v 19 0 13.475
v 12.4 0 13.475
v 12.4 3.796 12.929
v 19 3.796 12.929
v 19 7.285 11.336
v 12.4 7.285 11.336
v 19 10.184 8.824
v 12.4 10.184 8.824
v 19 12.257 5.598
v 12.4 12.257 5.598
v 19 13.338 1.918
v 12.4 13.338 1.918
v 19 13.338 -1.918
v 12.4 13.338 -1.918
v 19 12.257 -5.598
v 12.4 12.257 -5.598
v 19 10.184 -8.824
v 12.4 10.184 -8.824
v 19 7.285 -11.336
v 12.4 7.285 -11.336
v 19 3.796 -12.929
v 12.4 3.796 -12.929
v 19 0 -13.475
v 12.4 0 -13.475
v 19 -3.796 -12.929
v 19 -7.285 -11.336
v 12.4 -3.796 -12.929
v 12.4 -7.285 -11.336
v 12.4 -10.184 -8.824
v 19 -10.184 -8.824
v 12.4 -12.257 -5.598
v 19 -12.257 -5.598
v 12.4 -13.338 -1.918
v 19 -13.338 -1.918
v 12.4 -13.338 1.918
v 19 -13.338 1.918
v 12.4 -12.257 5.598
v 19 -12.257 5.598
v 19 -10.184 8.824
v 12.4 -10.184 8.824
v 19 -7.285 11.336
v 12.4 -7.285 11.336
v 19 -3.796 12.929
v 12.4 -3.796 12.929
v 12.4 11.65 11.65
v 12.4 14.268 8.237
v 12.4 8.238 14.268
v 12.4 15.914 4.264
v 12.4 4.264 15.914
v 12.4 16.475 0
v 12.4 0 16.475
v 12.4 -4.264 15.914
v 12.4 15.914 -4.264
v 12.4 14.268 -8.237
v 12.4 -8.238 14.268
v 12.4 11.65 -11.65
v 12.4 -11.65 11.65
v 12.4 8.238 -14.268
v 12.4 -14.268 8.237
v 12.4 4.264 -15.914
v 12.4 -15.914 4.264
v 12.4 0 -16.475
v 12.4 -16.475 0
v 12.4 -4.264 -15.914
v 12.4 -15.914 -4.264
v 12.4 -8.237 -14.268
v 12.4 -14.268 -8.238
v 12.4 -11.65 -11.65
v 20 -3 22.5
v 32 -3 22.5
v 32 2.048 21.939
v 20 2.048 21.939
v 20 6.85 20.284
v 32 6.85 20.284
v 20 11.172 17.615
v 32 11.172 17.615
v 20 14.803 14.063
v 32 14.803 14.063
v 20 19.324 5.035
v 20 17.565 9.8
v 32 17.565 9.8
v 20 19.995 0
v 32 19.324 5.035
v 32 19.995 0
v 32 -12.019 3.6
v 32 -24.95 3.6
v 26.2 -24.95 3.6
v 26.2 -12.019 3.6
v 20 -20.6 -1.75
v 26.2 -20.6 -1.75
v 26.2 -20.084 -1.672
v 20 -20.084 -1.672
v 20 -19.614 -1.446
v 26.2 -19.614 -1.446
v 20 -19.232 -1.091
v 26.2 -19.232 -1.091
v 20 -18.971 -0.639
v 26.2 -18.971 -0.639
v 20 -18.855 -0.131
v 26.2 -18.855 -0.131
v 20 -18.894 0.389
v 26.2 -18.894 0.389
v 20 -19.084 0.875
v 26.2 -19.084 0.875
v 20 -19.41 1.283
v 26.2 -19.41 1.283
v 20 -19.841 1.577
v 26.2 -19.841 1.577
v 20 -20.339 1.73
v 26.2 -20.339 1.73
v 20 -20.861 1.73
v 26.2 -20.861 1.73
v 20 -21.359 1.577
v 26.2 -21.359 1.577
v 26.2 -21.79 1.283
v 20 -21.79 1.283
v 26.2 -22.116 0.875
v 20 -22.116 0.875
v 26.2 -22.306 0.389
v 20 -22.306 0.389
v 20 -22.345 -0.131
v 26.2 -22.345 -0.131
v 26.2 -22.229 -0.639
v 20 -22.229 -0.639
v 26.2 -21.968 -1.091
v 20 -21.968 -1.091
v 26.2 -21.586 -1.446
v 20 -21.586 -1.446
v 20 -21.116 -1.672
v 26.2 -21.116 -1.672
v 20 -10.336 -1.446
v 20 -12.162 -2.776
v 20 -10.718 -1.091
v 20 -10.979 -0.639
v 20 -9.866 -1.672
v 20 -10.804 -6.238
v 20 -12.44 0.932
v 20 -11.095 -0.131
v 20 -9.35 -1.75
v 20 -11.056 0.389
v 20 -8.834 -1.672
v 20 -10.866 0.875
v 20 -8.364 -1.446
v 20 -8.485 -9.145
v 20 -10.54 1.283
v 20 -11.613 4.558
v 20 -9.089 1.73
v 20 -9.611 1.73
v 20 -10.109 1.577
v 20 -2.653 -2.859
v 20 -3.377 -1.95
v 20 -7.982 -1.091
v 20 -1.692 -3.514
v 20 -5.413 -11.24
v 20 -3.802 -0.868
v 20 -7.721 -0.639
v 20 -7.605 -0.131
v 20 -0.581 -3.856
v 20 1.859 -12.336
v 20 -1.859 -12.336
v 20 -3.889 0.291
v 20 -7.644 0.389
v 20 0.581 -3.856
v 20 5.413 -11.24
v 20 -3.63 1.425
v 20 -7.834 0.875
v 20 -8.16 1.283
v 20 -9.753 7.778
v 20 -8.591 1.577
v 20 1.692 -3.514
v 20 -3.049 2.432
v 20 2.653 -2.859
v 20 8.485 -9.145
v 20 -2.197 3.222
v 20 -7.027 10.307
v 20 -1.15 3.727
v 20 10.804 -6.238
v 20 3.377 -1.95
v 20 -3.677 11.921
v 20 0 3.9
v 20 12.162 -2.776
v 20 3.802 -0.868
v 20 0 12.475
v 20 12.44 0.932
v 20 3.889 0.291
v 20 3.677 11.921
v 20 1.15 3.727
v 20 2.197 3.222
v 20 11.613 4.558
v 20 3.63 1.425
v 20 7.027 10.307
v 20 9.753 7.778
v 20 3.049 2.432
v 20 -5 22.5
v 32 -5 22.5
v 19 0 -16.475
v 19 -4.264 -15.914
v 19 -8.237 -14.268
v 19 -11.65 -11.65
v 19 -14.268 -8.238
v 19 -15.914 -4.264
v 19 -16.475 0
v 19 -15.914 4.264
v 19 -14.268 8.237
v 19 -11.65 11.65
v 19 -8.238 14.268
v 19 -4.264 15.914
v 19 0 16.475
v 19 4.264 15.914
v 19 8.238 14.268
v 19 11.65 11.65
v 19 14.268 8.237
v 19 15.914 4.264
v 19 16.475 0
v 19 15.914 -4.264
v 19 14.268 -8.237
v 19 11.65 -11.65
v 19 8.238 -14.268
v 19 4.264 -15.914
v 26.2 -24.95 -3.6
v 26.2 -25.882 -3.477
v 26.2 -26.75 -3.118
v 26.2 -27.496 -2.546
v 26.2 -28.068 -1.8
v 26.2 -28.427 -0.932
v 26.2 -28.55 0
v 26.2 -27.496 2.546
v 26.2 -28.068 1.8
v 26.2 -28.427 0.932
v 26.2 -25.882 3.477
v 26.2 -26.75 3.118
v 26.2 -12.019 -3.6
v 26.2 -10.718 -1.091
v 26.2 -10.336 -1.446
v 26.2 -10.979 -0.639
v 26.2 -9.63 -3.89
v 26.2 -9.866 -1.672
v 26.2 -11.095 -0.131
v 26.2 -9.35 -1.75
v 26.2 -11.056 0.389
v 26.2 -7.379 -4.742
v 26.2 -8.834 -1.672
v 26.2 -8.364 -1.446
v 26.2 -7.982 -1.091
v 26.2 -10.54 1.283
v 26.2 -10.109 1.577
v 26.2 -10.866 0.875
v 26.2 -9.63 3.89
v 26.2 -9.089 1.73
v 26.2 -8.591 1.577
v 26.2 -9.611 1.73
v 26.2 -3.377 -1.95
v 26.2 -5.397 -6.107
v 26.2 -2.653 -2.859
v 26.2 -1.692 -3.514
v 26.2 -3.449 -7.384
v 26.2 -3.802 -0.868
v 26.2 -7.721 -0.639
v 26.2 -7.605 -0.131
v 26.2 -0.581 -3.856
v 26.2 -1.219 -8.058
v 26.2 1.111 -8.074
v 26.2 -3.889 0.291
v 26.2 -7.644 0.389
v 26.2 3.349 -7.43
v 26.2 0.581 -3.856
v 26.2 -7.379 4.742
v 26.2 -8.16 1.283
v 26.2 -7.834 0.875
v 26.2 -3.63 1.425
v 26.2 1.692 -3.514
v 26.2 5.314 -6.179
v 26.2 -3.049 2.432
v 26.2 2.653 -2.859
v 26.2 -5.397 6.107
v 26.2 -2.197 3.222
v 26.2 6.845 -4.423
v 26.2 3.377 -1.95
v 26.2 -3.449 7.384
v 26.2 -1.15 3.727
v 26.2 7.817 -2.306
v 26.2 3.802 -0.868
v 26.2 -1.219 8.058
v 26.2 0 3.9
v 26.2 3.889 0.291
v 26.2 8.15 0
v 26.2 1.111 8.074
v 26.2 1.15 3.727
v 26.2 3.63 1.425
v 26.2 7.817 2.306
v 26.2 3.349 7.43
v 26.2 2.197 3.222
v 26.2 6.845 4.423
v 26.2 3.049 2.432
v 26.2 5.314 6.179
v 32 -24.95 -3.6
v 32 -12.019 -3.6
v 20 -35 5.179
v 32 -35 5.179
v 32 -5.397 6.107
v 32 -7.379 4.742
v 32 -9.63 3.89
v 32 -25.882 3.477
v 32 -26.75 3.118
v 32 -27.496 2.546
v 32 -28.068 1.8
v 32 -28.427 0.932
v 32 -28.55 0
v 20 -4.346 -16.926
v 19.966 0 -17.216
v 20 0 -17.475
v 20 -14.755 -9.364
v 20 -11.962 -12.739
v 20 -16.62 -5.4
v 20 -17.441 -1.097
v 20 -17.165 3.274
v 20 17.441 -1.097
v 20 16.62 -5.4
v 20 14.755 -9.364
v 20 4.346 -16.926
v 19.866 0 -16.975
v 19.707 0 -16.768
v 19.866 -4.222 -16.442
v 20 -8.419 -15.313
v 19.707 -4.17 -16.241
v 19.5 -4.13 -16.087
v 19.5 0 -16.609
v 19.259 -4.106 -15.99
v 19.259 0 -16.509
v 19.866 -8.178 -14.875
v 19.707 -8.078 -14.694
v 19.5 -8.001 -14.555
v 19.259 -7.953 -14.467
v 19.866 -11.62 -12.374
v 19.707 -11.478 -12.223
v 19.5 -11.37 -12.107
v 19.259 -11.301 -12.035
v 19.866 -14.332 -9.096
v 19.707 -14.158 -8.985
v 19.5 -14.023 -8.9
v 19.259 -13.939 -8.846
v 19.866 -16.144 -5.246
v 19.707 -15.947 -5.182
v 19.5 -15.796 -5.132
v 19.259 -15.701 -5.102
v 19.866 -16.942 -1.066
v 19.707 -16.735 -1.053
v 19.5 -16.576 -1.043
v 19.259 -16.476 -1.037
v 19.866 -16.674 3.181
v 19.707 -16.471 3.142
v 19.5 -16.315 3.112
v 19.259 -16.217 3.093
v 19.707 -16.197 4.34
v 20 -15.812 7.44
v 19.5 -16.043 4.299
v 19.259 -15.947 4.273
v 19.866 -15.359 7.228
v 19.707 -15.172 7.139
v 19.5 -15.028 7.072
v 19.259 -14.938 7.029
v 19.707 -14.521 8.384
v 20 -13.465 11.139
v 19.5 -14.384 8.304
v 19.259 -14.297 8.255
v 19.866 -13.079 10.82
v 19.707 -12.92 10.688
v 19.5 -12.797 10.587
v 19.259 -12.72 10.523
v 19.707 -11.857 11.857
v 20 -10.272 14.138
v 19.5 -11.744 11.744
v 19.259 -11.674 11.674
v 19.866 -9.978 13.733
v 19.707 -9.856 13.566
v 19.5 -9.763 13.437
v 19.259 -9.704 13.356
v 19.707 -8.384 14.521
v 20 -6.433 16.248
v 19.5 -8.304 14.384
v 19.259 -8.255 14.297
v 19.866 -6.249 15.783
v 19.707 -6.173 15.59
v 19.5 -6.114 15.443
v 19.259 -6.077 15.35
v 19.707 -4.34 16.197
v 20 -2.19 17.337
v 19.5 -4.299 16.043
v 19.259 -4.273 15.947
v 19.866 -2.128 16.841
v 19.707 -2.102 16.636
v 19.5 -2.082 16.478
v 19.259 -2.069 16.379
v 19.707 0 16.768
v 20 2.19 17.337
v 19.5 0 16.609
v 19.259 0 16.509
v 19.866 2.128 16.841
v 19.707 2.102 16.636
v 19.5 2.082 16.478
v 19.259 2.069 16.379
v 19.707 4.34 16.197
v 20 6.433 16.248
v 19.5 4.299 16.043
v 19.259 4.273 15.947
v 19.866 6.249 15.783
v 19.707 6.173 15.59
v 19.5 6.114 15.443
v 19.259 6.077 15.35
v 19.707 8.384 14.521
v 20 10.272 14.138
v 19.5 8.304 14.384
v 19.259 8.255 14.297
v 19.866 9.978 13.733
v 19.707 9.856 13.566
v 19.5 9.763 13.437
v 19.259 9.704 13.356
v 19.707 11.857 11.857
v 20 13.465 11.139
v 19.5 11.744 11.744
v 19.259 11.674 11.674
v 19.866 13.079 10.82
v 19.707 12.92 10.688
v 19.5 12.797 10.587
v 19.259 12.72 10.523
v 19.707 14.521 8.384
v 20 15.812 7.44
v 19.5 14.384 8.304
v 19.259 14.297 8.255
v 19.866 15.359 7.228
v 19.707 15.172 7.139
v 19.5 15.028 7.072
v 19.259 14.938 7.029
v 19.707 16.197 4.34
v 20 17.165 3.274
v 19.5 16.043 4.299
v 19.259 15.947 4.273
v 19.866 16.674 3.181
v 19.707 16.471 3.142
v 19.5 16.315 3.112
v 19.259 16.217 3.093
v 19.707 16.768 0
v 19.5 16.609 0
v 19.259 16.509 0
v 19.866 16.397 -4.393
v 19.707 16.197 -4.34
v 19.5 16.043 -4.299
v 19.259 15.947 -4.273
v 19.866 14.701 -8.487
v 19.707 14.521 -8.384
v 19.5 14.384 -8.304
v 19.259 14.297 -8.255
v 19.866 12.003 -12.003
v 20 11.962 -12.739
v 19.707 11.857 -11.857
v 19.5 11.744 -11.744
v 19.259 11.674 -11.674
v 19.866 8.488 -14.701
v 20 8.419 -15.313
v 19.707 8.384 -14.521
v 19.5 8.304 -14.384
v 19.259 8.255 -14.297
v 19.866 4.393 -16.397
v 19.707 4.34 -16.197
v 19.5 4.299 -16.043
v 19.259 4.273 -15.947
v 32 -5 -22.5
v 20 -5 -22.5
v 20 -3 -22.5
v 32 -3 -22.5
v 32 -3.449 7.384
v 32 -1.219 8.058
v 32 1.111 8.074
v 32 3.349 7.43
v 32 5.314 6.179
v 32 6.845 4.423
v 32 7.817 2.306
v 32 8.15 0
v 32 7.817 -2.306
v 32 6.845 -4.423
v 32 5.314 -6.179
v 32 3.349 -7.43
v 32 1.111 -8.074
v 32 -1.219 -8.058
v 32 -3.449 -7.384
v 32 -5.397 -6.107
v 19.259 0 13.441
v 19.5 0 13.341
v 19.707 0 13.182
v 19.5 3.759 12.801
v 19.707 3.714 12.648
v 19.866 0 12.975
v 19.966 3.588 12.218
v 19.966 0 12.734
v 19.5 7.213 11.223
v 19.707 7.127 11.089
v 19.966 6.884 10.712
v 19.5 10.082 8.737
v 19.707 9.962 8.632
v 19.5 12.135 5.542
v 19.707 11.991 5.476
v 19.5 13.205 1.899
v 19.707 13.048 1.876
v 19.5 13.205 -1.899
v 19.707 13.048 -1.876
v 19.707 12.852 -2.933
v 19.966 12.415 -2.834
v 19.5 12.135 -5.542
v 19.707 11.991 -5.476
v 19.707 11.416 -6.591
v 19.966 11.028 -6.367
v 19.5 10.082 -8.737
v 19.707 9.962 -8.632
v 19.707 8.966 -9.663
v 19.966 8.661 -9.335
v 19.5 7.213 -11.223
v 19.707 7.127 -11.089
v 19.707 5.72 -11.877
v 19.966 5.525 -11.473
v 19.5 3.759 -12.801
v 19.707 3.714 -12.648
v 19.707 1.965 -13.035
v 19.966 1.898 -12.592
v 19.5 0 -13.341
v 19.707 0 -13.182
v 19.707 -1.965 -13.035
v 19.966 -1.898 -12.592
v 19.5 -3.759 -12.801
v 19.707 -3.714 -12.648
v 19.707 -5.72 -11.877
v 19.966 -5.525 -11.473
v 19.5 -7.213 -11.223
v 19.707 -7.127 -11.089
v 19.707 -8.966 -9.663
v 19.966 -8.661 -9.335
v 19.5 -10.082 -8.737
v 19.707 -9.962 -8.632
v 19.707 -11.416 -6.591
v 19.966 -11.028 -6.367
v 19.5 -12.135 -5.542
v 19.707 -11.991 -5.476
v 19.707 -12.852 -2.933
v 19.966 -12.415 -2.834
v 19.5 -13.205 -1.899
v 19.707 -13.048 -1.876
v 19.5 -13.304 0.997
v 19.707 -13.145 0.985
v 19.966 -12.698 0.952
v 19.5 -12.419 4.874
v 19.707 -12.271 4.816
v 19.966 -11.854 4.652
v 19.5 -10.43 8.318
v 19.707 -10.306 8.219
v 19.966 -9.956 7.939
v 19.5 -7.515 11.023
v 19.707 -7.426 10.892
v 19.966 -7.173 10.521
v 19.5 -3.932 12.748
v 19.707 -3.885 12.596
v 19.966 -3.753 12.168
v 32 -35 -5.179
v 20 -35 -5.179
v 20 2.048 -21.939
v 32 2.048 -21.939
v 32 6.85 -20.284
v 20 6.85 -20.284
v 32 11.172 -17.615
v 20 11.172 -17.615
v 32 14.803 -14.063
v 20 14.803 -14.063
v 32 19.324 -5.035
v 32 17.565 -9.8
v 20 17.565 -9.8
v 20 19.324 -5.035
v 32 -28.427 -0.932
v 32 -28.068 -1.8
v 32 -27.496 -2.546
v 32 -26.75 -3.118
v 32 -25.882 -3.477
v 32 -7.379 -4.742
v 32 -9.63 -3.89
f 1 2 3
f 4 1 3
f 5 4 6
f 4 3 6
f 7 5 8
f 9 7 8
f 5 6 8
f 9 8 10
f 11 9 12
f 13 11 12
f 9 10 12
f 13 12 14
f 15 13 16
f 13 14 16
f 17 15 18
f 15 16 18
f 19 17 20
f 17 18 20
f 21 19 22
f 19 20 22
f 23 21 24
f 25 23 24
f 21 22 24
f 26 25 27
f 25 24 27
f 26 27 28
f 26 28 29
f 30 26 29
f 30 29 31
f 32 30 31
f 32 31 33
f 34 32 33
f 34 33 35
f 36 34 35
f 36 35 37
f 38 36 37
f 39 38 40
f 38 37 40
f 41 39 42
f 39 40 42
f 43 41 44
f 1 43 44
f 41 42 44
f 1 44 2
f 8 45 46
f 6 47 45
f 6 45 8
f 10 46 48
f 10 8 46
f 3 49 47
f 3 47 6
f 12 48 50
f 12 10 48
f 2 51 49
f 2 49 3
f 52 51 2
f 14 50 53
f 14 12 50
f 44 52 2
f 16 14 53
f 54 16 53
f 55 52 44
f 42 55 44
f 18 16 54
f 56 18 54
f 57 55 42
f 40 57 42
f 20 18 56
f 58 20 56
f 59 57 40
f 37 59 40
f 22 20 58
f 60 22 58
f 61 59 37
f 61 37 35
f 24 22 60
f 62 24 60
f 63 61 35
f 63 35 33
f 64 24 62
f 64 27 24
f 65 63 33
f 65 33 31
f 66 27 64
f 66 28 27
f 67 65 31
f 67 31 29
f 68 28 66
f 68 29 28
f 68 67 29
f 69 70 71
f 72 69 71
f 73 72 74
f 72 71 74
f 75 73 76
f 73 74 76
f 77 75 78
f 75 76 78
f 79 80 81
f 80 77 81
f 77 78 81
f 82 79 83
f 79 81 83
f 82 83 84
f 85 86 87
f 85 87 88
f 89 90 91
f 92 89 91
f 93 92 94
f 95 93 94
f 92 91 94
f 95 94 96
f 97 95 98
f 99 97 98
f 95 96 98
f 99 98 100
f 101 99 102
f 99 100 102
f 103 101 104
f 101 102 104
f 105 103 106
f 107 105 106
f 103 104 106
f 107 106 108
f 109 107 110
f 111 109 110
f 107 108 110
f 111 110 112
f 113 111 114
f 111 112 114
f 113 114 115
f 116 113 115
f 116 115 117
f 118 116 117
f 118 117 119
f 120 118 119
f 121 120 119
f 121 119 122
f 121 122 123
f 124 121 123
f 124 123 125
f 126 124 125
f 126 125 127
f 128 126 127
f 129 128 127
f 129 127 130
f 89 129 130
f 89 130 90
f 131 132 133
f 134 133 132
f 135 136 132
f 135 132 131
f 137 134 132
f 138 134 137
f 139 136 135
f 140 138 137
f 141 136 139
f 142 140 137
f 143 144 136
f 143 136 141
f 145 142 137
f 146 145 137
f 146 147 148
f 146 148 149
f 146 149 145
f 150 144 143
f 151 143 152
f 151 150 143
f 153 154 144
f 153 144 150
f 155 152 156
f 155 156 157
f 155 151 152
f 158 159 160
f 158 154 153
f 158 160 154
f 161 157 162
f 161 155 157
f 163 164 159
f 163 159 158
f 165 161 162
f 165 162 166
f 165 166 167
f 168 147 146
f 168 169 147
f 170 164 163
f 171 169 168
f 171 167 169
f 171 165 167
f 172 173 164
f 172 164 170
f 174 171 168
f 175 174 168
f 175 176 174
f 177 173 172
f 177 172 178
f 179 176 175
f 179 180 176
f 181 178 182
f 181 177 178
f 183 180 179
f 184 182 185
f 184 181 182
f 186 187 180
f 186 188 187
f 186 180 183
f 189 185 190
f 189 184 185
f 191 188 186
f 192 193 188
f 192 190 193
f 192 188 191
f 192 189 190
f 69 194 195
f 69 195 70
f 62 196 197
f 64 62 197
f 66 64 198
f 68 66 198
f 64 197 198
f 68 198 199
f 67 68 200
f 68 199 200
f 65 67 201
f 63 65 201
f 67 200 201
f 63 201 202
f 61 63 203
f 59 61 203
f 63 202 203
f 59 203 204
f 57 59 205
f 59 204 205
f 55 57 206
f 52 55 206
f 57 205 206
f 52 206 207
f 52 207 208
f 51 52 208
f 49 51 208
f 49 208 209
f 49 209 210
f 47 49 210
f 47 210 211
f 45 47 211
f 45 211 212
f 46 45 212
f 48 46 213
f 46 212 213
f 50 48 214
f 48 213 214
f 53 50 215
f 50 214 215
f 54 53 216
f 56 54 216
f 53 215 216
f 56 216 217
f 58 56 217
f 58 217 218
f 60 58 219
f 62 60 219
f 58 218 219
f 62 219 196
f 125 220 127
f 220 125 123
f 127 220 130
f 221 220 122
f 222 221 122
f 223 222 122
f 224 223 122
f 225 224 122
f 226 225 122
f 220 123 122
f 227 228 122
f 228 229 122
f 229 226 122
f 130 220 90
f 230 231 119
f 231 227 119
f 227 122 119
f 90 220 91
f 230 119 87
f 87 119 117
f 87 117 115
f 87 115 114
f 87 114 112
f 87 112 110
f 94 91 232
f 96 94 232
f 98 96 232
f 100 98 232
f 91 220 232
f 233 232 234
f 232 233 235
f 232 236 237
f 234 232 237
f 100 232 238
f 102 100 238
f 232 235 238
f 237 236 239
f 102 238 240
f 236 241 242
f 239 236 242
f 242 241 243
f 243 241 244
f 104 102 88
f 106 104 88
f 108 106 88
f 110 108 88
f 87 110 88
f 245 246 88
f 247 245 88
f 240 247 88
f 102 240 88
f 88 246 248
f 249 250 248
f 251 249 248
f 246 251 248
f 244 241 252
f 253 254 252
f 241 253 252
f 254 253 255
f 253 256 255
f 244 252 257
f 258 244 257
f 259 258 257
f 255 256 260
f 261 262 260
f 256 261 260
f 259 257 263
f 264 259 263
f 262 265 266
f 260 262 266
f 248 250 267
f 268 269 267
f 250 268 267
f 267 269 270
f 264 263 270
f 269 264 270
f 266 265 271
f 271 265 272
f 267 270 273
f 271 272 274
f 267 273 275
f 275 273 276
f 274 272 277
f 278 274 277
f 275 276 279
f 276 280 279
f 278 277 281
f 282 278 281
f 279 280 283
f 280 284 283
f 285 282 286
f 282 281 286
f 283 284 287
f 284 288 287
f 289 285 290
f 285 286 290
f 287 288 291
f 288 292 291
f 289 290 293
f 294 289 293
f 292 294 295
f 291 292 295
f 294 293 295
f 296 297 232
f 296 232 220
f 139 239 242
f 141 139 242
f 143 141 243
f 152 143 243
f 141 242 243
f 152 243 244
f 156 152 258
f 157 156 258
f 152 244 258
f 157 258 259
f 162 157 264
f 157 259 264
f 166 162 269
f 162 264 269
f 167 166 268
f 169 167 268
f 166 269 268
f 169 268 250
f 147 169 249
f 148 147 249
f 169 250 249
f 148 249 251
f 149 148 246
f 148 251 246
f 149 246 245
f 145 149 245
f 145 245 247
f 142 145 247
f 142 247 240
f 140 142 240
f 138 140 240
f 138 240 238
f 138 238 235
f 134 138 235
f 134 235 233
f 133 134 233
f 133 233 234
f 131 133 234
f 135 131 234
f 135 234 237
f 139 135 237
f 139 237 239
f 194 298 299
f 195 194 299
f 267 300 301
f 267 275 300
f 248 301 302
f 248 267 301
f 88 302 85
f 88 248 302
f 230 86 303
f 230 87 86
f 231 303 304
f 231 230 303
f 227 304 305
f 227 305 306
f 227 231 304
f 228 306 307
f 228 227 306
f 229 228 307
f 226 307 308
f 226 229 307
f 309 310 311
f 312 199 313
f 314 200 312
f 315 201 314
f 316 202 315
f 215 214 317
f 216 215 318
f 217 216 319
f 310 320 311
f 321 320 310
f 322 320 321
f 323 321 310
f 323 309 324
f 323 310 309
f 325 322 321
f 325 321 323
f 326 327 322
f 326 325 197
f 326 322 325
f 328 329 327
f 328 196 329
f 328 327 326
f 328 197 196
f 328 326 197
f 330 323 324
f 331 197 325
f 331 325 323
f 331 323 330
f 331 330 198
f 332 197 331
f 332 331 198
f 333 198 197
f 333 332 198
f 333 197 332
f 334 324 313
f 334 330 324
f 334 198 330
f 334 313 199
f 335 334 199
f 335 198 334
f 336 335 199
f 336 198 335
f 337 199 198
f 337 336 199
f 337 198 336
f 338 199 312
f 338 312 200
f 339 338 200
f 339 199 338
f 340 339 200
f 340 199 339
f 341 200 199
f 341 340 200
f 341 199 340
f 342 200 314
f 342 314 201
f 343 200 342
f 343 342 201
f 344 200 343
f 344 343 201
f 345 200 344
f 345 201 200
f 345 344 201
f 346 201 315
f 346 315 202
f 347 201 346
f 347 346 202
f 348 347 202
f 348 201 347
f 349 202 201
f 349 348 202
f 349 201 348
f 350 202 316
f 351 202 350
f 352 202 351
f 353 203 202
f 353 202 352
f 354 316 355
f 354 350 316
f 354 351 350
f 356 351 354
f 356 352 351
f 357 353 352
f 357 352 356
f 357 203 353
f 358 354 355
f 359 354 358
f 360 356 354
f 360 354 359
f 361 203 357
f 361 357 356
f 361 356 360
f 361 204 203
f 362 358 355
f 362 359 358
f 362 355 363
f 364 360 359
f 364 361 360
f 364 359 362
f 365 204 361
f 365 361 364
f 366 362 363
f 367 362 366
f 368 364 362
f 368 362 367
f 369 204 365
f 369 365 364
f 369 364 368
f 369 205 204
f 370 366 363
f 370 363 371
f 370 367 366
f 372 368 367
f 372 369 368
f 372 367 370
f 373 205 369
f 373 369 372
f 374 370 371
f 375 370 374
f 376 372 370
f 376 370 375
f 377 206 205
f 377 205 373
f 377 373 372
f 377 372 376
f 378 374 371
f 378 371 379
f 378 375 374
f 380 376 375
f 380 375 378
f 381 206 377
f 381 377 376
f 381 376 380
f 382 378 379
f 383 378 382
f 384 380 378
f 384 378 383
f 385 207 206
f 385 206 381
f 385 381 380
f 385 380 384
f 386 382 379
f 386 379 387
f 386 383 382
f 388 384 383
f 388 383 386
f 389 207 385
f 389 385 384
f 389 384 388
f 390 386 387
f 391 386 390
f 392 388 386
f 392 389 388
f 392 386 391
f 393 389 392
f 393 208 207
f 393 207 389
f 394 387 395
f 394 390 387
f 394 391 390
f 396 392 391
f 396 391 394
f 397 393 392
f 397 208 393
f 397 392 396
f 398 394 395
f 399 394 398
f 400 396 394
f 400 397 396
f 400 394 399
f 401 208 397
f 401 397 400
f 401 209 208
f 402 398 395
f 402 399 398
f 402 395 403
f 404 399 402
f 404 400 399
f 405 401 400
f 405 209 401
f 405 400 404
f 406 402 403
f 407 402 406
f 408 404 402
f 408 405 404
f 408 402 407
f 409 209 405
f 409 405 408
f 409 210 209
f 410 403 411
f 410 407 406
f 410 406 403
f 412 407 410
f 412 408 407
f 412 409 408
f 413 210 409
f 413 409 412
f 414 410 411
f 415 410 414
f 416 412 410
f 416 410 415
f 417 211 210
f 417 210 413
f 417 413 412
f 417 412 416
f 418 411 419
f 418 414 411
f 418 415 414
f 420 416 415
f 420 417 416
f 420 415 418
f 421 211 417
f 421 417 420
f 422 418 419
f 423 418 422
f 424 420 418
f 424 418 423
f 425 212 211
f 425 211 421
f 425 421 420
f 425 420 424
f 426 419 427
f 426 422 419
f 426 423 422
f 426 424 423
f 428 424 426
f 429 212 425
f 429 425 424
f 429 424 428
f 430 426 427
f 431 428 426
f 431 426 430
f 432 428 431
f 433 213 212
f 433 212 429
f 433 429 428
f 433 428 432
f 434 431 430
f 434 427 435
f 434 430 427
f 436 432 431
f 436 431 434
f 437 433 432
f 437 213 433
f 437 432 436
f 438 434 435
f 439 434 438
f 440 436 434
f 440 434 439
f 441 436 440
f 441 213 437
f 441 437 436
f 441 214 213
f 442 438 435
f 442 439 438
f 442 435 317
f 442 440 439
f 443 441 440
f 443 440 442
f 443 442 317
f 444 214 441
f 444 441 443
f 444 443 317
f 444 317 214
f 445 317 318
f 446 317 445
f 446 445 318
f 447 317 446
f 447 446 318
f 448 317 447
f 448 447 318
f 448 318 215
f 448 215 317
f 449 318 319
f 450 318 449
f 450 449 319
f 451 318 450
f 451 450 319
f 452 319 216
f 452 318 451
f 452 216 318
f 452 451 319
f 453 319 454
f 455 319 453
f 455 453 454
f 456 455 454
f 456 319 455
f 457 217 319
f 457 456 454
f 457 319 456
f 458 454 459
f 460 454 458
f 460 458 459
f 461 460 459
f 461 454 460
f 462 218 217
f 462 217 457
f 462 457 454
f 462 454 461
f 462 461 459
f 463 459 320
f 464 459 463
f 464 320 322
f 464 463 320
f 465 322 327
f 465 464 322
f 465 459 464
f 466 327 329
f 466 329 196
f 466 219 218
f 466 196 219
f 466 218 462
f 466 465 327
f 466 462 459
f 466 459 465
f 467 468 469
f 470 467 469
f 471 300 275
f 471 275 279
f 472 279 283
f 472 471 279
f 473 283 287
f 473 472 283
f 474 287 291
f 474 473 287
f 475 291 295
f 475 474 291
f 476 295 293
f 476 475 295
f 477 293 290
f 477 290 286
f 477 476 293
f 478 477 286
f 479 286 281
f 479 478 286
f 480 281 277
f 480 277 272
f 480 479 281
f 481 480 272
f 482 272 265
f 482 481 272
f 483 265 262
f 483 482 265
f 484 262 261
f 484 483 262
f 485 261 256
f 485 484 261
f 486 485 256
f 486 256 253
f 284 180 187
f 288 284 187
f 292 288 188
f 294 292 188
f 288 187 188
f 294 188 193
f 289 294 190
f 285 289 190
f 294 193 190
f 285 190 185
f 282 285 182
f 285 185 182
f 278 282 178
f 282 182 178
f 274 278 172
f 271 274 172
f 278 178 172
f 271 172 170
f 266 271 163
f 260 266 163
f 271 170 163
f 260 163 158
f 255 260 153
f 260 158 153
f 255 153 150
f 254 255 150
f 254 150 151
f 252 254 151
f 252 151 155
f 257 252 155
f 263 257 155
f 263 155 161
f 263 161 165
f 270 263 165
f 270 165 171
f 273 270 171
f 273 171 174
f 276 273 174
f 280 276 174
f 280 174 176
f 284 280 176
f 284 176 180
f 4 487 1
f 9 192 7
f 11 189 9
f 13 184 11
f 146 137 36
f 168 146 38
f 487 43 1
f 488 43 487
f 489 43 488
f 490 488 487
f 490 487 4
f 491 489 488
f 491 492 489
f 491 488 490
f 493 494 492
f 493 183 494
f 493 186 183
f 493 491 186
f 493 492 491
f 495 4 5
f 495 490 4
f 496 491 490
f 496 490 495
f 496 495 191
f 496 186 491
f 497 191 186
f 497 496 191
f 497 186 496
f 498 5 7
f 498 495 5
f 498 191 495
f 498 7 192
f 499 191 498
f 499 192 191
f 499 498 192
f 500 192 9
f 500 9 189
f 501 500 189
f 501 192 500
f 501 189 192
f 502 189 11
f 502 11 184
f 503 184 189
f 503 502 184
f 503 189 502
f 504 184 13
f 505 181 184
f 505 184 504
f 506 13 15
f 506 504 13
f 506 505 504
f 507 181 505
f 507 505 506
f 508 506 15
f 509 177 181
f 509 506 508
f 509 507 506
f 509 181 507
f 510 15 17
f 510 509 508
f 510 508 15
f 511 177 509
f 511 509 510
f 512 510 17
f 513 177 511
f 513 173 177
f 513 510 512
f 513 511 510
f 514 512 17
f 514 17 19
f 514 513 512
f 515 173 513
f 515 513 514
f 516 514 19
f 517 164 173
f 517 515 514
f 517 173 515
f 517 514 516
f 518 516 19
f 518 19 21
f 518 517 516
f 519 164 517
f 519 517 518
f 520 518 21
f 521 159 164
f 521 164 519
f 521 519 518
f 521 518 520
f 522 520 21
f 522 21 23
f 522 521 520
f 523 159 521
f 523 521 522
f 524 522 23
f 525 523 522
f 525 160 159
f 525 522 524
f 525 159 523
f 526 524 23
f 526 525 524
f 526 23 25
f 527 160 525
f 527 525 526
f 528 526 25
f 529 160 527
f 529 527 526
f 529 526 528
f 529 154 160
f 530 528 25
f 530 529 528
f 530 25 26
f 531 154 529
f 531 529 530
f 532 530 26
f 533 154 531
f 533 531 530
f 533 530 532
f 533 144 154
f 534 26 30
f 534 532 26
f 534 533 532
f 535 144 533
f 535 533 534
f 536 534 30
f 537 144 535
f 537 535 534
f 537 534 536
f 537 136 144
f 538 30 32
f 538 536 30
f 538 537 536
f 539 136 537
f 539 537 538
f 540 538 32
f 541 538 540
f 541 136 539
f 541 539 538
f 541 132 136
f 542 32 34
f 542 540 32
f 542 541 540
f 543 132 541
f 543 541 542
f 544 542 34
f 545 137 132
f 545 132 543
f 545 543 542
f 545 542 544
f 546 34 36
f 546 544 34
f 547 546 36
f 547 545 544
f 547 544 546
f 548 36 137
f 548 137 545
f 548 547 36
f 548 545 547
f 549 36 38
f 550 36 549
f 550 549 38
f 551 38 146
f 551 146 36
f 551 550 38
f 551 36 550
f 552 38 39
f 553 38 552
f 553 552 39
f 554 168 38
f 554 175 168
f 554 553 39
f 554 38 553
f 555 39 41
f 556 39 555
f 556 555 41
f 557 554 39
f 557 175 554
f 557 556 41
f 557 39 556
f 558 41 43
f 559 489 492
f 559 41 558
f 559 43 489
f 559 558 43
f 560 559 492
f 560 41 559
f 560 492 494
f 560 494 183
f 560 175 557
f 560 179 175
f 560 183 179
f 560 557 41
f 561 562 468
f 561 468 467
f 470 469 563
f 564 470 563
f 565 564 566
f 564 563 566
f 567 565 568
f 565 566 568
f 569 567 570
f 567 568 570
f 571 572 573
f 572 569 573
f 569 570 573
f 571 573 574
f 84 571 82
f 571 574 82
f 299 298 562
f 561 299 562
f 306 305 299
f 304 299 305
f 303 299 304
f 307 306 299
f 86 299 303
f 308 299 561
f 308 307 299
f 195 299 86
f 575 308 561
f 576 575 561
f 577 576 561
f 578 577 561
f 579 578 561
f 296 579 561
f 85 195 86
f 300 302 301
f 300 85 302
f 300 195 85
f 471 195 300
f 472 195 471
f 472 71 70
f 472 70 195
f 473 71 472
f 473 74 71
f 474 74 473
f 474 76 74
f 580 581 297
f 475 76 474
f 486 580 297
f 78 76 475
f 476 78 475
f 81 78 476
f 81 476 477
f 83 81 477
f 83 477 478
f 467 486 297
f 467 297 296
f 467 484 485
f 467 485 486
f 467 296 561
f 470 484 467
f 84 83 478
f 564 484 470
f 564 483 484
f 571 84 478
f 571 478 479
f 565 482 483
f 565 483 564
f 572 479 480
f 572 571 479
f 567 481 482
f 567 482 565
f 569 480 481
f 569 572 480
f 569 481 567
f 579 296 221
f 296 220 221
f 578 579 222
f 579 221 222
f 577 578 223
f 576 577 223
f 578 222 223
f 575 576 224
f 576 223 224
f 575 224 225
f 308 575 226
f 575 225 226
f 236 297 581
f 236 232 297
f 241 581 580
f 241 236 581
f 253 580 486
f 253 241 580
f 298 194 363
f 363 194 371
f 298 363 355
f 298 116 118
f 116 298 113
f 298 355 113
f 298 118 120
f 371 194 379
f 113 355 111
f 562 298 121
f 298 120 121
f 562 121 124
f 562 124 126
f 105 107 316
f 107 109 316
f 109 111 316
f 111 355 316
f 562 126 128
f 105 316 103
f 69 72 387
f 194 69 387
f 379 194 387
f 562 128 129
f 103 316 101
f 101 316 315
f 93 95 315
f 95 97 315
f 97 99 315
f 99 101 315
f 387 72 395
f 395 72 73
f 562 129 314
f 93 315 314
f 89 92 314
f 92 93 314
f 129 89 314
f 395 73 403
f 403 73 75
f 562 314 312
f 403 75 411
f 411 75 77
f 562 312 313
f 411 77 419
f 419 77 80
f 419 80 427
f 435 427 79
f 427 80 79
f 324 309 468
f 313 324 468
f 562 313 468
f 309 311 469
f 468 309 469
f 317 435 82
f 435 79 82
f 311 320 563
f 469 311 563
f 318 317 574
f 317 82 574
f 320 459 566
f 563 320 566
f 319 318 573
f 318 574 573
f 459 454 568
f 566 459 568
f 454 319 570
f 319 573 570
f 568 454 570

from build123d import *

# Parameters (mm, degrees)
SKETCH1_W           = 20
SKETCH1_H           = 20
BOSS_EXTRUDE1_DEPTH = 20
SKETCH2_W           = 45
SKETCH2_H           = 70
BOSS_EXTRUDE2_DEPTH = 12
CUT_EXTRUDE1_DEPTH  = 5.8
FILLET1_R           = 3.6
FILLET2_R           = 10
SKETCH5_R           = 3.9
CUT_EXTRUDE2_DEPTH  = 53.490475326
CUT_EXTRUDE3_REACH  = 51.17
SKETCH6_R           = 1.75
SKETCH13_W          = 20
SKETCH13_H          = 20
CUT_EXTRUDE9_DEPTH  = 20
SKETCH14_R          = 16.475
BOSS_EXTRUDE3_DEPTH = 7.6
SKETCH15_W          = 12
SKETCH15_H          = 45
CUT_EXTRUDE10_DEPTH = 15
FILLET3_R           = 23
CHAMFER1_SIZE       = 30
CHAMFER1_SIZE2      = 17.320508076
CHAMFER2_SIZE       = 30
CHAMFER2_SIZE2      = 17.320508076
SKETCH16_R          = 13.475
CUT_EXTRUDE11_DEPTH = 7.6
FILLET4_R           = 1


# Some blends are built 0.0001 mm under size
with BuildPart() as part:
    # Sketch1 → Boss-Extrude1 (new body)
    with BuildSketch(Plane(origin=(0, 0, 0), x_dir=(0, 0, -1), z_dir=(1, 0, 0))):
        Rectangle(SKETCH1_W, SKETCH1_H)
    extrude(amount=BOSS_EXTRUDE1_DEPTH)

    # Sketch2 → Boss-Extrude2 (add)
    with BuildSketch(Plane(origin=(20, 0, 0), x_dir=(0, 0, -1), z_dir=(1, 0, 0))):
        Rectangle(SKETCH2_W, SKETCH2_H)
    extrude(amount=BOSS_EXTRUDE2_DEPTH)

    # Sketch4 → Cut-Extrude1 (cut)
    with BuildSketch(Plane(origin=(32, 0, 0), x_dir=(0, 0, -1), z_dir=(1, 0, 0))):
        with BuildLine():
            Line((3.6, -28.55), (-3.6, -28.55))
            Line((-3.6, -28.55), (-3.6, -7.311805523))
            ThreePointArc((-3.6, -7.311805523), (0, 8.15), (3.6, -7.311805523))
            Line((3.6, -7.311805523), (3.6, -28.55))
        make_face()
    extrude(amount=-CUT_EXTRUDE1_DEPTH, mode=Mode.SUBTRACT)

    # Fillet1
    fillet1_edges = [part.edges().sort_by_distance(p)[0] for p in [
        (29.1, -28.55, 3.6),
        (29.1, -28.55, -3.6),
    ]]
    fillet(fillet1_edges, radius=FILLET1_R - 0.0001)  # a hair under: the kernel refuses the full size

    # Fillet2
    fillet2_edges = [part.edges().sort_by_distance(p)[0] for p in [
        (29.1, -7.311805523, 3.6),
        (29.1, -7.311805523, -3.6),
    ]]
    fillet(fillet2_edges, radius=FILLET2_R)

    # Sketch5 → Cut-Extrude2 (cut, through all)
    with BuildSketch(Plane.ZY):
        Circle(SKETCH5_R)
    extrude(amount=-CUT_EXTRUDE2_DEPTH, mode=Mode.SUBTRACT)

    # Sketch6 → Cut-Extrude3 (cut, up to next)
    with BuildSketch(Plane(origin=(26.2, 0, 0), x_dir=(0, 0, -1), z_dir=(1, 0, 0)), mode=Mode.PRIVATE) as cut_extrude3_sk1:
        with Locations((0, -20.6)):
            Circle(SKETCH6_R)
    cut_extrude3_tool1 = extrude(cut_extrude3_sk1.sketch, amount=-CUT_EXTRUDE3_REACH, mode=Mode.PRIVATE) & part.part
    # Sketch6 → Cut-Extrude3 (cut, up to next)
    with BuildSketch(Plane(origin=(26.2, 0, 0), x_dir=(0, 0, -1), z_dir=(1, 0, 0)), mode=Mode.PRIVATE) as cut_extrude3_sk2:
        with Locations((0, -9.35)):
            Circle(SKETCH6_R)
    cut_extrude3_tool2 = extrude(cut_extrude3_sk2.sketch, amount=-CUT_EXTRUDE3_REACH, mode=Mode.PRIVATE) & part.part
    add(cut_extrude3_tool1.solids().sort_by_distance((26.2, -20.6, 0))[0], mode=Mode.SUBTRACT)
    add(cut_extrude3_tool2.solids().sort_by_distance((26.2, -9.35, 0))[0], mode=Mode.SUBTRACT)

    # Sketch13 → Cut-Extrude9 (cut)
    with BuildSketch(Plane.ZY):
        Rectangle(SKETCH13_W, SKETCH13_H)
    extrude(amount=-CUT_EXTRUDE9_DEPTH, mode=Mode.SUBTRACT)

    # Sketch14 → Boss-Extrude3 (add)
    with BuildSketch(Plane.ZY.offset(-20)):
        with Locations(Location((0, 0, 0), (0, 0, 180))):
            Circle(SKETCH14_R)
    extrude(amount=BOSS_EXTRUDE3_DEPTH)

    # Sketch15 → Cut-Extrude10 (cut)
    with BuildSketch(Plane(origin=(0, 35, 0), x_dir=(1, 0, 0), z_dir=(0, 1, 0))):
        with Locations((26, 0)):
            Rectangle(SKETCH15_W, SKETCH15_H)
    extrude(amount=-CUT_EXTRUDE10_DEPTH, mode=Mode.SUBTRACT)

    # Fillet3
    # the kernel refuses this fillet: 23 mm, written as the material it takes off along each edge
    with BuildSketch(Plane(origin=(-37.5, 20, -22.5), x_dir=(0, -1, 0), z_dir=(1, 0, 0)), Plane(origin=(89.5, 20, 22.5), x_dir=(0, -1, 0), z_dir=(-1, 0, 0))) as fillet3_piece_1:
        with BuildLine():
            CenterArc((FILLET3_R, -FILLET3_R), FILLET3_R, 90, 90)
            Line((0, -FILLET3_R), (0, 0))
            Line((0, 0), (FILLET3_R, 0))
        make_face()
    extrude(amount=127, mode=Mode.SUBTRACT)

    # Chamfer1
    chamfer1_edges = [part.edges().sort_by_distance(p)[0] for p in [
        (26, -35, 22.5),
    ]]
    chamfer1_side = [part.faces().sort_by_distance(p)[0] for p in [
        (26, -19, 22.5),
    ]]
    chamfer(chamfer1_edges, length=CHAMFER1_SIZE, length2=CHAMFER1_SIZE2, reference=chamfer1_side[0])

    # Chamfer2
    chamfer2_edges = [part.edges().sort_by_distance(p)[0] for p in [
        (26, -35, -22.5),
    ]]
    chamfer2_side = [part.faces().sort_by_distance(p)[0] for p in [
        (26, -19, -22.5),
    ]]
    chamfer(chamfer2_edges, length=CHAMFER2_SIZE, length2=CHAMFER2_SIZE2, reference=chamfer2_side[0])

    # Sketch16 → Cut-Extrude11 (cut)
    with BuildSketch(Plane.ZY.offset(-12.4)):
        Circle(SKETCH16_R)
    extrude(amount=-CUT_EXTRUDE11_DEPTH, mode=Mode.SUBTRACT)

    # Fillet4
    fillet4_edges = [part.edges().sort_by_distance(p)[0] for p in [
        (20, 0, 16.475),
        (20, 0, -13.475),
    ]]
    fillet(fillet4_edges, radius=FILLET4_R)


solid = part.part
